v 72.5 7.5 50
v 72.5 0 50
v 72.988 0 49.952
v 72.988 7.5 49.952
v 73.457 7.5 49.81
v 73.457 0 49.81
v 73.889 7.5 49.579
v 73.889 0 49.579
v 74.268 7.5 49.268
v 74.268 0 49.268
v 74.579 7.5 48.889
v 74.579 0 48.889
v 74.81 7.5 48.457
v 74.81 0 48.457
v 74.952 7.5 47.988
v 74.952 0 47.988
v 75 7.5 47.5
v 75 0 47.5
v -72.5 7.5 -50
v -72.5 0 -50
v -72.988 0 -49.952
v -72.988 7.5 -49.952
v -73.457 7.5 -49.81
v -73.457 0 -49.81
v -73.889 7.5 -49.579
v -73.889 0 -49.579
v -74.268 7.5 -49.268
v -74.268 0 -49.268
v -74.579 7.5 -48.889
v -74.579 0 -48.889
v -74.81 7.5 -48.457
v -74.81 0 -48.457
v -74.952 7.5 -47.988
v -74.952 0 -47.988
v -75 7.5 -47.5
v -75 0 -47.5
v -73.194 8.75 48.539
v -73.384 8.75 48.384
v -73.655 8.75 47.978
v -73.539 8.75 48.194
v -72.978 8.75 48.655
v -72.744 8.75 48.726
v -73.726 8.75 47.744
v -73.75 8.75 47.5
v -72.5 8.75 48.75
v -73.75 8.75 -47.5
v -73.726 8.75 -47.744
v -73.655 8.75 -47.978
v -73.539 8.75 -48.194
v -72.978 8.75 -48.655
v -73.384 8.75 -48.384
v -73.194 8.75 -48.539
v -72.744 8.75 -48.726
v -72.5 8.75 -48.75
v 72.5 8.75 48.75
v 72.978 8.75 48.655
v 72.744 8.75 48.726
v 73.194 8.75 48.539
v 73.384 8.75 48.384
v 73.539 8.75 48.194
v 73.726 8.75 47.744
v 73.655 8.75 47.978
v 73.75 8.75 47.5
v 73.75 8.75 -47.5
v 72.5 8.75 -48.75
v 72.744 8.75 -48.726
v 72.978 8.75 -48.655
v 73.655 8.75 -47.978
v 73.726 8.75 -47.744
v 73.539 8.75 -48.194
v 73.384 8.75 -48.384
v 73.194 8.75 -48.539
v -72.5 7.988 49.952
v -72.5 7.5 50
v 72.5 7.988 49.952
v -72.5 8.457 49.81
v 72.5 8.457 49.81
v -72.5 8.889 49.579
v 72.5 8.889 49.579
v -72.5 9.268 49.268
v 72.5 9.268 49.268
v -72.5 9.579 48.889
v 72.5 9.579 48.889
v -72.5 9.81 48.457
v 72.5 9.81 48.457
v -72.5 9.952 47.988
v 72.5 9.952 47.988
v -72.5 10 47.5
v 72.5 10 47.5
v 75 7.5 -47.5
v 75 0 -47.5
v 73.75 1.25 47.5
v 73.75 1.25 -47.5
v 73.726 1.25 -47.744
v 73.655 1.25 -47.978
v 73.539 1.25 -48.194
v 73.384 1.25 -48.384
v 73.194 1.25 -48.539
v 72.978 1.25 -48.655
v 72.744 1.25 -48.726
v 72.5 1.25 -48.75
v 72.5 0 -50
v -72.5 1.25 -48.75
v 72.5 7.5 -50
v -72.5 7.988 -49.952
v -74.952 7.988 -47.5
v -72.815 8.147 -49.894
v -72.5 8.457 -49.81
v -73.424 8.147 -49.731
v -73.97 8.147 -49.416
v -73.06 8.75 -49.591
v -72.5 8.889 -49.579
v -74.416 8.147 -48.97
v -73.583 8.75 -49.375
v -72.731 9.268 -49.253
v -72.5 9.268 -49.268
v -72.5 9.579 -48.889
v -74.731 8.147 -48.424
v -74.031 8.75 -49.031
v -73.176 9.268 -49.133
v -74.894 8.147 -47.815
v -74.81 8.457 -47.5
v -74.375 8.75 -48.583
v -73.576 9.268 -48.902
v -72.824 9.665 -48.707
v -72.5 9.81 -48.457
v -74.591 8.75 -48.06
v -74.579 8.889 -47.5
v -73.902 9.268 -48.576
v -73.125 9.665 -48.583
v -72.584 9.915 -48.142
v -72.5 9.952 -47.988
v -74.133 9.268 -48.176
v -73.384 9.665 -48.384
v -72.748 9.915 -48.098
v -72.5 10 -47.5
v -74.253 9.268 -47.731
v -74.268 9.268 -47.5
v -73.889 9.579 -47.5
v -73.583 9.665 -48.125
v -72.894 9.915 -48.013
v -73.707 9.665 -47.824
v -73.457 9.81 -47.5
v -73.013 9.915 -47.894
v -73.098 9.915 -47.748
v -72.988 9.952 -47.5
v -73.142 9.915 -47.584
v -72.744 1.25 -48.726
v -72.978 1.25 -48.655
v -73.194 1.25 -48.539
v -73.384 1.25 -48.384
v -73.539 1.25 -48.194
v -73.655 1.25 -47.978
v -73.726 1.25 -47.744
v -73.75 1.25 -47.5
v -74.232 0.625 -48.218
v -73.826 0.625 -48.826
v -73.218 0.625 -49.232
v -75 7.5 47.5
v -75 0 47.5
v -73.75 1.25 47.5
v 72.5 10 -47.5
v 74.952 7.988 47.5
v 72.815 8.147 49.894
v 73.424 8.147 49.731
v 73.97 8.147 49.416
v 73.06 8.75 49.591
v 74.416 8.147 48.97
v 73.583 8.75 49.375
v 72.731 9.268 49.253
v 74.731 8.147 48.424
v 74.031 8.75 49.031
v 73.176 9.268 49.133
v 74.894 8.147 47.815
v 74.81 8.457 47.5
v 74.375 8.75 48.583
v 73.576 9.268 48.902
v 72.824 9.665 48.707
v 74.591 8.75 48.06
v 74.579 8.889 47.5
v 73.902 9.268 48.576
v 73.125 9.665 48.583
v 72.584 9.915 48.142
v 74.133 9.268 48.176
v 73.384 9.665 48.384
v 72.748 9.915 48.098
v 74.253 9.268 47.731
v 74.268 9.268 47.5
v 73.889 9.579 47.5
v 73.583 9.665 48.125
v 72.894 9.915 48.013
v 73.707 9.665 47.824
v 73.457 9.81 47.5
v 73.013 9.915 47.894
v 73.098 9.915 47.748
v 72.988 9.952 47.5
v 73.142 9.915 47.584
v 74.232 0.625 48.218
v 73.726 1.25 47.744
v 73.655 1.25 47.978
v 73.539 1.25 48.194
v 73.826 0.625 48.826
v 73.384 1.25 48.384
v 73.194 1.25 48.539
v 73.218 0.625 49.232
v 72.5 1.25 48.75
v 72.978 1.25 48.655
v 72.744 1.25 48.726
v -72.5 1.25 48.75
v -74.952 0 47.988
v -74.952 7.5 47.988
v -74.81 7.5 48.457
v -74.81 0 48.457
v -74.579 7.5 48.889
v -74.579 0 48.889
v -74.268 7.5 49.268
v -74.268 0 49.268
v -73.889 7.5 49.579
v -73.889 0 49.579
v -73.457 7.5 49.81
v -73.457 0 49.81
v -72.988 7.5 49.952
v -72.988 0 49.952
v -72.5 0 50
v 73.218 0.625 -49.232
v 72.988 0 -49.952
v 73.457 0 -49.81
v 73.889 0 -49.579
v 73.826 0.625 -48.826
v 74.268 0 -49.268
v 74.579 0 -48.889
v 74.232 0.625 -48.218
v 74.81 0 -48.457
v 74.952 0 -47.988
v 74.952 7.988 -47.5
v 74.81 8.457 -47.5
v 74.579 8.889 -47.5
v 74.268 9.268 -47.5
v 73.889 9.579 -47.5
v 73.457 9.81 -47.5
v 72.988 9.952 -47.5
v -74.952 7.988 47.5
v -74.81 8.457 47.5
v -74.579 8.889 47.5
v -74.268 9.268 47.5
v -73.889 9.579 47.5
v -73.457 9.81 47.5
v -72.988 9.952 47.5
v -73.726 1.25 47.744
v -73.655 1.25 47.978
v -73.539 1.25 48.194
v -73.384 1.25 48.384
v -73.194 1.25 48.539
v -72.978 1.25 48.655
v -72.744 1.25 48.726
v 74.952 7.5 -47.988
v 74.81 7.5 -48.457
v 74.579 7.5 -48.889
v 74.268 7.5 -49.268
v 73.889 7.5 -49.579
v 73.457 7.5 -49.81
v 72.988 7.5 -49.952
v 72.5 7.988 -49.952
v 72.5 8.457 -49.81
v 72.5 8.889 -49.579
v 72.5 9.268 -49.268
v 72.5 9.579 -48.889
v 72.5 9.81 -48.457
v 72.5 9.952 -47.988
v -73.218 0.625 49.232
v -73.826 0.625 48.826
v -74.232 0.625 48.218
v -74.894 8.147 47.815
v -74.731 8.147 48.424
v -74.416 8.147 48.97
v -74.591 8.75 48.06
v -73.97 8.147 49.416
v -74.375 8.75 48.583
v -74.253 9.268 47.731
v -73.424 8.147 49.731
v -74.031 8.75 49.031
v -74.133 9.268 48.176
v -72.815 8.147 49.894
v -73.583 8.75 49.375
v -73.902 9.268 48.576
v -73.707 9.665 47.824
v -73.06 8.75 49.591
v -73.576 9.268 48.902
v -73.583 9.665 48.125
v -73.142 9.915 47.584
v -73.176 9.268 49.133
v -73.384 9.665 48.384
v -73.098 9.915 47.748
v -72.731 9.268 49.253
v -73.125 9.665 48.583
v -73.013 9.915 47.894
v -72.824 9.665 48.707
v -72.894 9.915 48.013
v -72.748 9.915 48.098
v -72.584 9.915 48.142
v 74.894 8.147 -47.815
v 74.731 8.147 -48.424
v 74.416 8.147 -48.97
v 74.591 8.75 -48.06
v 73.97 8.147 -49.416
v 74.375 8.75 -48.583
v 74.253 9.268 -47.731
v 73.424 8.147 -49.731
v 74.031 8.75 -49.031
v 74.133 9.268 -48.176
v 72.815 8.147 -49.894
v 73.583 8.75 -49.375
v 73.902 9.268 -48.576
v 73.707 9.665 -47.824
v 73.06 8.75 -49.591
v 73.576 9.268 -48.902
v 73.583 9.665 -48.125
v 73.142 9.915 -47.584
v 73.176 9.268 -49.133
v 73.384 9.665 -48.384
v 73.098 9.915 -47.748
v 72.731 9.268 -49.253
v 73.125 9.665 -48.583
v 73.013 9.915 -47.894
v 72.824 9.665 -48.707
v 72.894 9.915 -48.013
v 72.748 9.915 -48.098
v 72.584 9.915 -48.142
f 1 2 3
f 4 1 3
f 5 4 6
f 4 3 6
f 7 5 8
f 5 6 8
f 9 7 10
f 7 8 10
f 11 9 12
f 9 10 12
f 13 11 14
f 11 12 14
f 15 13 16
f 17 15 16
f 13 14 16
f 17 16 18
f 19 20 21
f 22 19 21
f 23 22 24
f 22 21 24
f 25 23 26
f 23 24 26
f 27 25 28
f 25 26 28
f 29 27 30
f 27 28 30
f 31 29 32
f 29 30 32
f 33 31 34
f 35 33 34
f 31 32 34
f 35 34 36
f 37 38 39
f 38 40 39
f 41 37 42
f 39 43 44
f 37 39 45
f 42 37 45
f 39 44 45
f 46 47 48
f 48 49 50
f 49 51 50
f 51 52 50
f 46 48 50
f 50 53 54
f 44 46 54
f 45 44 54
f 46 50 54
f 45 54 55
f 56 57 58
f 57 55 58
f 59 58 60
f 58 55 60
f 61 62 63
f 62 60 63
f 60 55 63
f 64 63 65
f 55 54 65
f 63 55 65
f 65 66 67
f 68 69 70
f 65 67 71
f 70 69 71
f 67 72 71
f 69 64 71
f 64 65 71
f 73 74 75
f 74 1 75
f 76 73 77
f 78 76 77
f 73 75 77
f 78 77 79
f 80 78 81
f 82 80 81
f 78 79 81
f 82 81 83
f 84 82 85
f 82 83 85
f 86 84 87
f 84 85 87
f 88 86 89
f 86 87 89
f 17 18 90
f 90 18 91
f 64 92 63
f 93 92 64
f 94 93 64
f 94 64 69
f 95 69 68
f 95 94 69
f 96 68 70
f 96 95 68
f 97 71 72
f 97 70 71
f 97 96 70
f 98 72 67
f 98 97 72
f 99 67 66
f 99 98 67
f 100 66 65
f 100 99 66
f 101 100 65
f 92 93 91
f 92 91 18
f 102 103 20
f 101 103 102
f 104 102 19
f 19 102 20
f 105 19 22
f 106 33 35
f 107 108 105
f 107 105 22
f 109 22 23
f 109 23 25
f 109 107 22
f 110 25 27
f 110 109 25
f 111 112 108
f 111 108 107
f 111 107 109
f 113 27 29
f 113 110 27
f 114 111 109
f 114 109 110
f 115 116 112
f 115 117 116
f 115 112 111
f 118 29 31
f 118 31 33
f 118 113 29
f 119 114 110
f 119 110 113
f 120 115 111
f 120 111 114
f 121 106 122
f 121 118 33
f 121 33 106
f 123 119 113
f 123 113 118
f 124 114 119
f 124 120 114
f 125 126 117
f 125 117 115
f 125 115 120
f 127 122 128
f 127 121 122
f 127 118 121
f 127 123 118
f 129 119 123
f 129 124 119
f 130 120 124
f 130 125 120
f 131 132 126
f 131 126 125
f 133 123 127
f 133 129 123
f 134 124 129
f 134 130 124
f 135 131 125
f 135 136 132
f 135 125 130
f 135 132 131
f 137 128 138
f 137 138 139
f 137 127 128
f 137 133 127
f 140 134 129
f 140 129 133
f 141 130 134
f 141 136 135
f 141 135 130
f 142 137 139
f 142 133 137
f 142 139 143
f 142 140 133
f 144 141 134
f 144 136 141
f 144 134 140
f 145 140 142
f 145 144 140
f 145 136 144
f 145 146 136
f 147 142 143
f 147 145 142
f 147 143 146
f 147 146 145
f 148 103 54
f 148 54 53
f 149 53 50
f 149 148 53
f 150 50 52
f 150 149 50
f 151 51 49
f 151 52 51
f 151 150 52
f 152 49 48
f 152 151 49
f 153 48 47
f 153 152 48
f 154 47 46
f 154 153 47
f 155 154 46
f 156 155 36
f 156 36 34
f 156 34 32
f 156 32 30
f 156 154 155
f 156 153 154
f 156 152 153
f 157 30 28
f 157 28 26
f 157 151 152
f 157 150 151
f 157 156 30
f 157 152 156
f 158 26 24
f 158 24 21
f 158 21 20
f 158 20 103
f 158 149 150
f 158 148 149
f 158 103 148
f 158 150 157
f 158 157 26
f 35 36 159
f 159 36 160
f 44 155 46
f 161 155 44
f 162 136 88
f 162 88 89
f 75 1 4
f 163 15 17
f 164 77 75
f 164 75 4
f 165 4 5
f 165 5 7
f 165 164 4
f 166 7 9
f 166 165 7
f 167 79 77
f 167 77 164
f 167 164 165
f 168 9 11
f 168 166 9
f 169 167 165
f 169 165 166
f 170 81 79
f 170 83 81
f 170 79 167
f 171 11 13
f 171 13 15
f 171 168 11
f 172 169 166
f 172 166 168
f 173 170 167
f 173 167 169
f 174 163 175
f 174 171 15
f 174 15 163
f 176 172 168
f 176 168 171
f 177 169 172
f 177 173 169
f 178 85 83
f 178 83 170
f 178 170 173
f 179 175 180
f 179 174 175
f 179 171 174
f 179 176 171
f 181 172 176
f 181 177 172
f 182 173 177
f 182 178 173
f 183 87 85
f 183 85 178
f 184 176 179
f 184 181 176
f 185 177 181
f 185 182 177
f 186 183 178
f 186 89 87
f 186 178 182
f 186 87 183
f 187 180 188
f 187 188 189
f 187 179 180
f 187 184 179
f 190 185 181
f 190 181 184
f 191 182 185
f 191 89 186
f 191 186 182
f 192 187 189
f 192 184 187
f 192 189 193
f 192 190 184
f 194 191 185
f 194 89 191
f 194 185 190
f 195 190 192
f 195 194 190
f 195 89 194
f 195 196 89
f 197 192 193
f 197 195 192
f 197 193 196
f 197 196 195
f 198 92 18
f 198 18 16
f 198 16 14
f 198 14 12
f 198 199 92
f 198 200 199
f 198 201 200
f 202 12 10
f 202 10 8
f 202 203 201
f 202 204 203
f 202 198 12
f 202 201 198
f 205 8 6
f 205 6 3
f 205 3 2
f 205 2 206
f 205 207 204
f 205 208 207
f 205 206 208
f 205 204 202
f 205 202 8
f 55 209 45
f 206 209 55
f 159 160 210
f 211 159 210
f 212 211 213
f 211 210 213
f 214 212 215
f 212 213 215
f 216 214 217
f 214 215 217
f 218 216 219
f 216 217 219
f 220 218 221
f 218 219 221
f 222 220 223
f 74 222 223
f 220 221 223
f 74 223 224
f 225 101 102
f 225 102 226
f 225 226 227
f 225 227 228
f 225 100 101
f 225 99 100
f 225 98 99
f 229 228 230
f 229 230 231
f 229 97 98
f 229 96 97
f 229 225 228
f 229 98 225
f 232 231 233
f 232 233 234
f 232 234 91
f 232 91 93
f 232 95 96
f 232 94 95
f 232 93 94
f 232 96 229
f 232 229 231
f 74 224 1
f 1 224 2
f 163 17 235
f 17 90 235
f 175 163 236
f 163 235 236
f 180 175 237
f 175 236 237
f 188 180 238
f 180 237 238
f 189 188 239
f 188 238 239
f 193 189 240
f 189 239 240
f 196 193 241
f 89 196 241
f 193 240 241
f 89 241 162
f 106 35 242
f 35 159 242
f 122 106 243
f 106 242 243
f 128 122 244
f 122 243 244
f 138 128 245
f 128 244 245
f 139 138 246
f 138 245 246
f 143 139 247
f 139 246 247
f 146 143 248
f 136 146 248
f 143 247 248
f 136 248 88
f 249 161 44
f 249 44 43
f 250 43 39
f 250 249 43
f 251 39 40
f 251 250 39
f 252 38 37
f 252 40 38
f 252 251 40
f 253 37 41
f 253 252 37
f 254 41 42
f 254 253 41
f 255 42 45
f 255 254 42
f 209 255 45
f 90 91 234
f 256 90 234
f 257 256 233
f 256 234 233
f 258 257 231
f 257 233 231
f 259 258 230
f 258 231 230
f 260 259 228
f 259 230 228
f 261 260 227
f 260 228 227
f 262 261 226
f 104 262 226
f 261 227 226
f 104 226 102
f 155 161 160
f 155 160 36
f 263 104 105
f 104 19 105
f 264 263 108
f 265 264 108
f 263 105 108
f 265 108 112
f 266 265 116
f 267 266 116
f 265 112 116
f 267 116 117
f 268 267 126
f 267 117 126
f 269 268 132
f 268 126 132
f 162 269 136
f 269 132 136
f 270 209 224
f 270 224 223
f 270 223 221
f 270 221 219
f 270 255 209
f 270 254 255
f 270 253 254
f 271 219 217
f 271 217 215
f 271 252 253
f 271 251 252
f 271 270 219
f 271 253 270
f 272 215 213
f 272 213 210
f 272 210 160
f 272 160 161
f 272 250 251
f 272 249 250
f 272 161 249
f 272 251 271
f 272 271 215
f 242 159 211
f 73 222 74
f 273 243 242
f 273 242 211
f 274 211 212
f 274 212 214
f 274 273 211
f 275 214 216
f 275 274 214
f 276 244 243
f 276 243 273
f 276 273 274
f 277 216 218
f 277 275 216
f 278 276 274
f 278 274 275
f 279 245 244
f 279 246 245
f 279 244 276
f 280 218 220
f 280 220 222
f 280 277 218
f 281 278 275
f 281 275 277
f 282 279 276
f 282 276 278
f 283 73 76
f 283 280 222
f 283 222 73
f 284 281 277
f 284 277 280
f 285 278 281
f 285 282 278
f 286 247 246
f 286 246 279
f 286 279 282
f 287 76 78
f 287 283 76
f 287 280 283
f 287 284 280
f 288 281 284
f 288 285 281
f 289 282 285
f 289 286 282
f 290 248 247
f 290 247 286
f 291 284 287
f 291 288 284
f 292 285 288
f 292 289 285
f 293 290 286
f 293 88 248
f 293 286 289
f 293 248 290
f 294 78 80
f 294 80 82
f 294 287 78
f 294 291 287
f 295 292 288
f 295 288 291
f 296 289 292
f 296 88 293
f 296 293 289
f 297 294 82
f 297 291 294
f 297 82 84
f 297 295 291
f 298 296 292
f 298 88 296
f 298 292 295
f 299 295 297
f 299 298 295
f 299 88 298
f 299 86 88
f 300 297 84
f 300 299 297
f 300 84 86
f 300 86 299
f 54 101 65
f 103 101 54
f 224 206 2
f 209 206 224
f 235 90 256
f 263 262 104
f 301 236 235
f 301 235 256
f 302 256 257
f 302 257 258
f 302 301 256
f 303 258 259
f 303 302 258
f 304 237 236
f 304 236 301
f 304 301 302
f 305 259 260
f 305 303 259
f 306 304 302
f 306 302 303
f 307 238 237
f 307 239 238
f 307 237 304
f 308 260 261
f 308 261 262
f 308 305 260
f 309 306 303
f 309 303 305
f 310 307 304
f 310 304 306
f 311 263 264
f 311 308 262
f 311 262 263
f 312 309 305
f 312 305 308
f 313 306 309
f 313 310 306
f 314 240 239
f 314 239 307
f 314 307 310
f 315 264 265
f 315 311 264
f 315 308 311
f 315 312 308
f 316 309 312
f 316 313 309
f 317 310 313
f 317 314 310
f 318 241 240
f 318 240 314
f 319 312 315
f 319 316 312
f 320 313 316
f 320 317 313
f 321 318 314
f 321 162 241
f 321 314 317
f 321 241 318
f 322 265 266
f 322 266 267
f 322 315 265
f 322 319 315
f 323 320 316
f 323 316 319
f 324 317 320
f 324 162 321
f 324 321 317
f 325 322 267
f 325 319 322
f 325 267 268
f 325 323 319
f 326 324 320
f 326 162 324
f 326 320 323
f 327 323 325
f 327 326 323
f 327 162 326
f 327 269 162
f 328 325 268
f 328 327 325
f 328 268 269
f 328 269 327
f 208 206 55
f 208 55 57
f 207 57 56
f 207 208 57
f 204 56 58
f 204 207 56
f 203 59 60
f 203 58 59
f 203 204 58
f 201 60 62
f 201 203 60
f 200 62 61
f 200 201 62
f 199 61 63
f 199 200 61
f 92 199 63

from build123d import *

# Parameters (mm, degrees)
BOSS_EXTRUDE1_DEPTH = 10
SHELL1_T            = -1.25
FILLET1_R           = 2.5
CHAMFER1_SIZE       = 1.25


with BuildPart() as part:
    # Sketch1 → Boss-Extrude1 (new body)
    with BuildSketch(Plane(origin=(0, 0, 0), x_dir=(1, 0, 0), z_dir=(0, 1, 0))):
        with BuildLine():
            Line((-72.5, -50), (72.5, -50))
            ThreePointArc((72.5, -50), (74.267766953, -49.267766953), (75, -47.5))
            Line((75, -47.5), (75, 47.5))
            ThreePointArc((75, 47.5), (74.267766953, 49.267766953), (72.5, 50))
            Line((72.5, 50), (-72.5, 50))
            ThreePointArc((-72.5, 50), (-74.267766953, 49.267766953), (-75, 47.5))
            Line((-75, 47.5), (-75, -47.5))
            ThreePointArc((-75, -47.5), (-74.267766953, -49.267766953), (-72.5, -50))
        make_face()
    extrude(amount=BOSS_EXTRUDE1_DEPTH)

    # Shell1
    shell1_openings = [part.faces().sort_by_distance(p)[0] for p in [
        (0, 0, 0),
    ]]
    offset(amount=SHELL1_T, openings=shell1_openings, kind=Kind.INTERSECTION)

    # Fillet1
    fillet1_edges = [part.edges().sort_by_distance(p)[0] for p in [
        (74.267766953, 10, 49.267766953),
        (75, 10, 0),
        (74.267766953, 10, -49.267766953),
        (0, 10, -50),
        (-74.267766953, 10, -49.267766953),
        (-75, 10, 0),
        (-74.267766953, 10, 49.267766953),
        (0, 10, 50),
    ]]
    fillet(fillet1_edges, radius=FILLET1_R)

    # Chamfer1
    chamfer1_edges = [part.edges().sort_by_distance(p)[0] for p in [
        (-73.383883476, 0, 48.383883476),
        (0, 0, 48.75),
        (73.383883476, 0, 48.383883476),
        (73.75, 0, 0),
        (73.383883476, 0, -48.383883476),
        (0, 0, -48.75),
        (-73.383883476, 0, -48.383883476),
        (-73.75, 0, 0),
    ]]
    chamfer(chamfer1_edges, length=CHAMFER1_SIZE - 0.0001)  # a hair under: the kernel refuses the full size


solid = part.part
